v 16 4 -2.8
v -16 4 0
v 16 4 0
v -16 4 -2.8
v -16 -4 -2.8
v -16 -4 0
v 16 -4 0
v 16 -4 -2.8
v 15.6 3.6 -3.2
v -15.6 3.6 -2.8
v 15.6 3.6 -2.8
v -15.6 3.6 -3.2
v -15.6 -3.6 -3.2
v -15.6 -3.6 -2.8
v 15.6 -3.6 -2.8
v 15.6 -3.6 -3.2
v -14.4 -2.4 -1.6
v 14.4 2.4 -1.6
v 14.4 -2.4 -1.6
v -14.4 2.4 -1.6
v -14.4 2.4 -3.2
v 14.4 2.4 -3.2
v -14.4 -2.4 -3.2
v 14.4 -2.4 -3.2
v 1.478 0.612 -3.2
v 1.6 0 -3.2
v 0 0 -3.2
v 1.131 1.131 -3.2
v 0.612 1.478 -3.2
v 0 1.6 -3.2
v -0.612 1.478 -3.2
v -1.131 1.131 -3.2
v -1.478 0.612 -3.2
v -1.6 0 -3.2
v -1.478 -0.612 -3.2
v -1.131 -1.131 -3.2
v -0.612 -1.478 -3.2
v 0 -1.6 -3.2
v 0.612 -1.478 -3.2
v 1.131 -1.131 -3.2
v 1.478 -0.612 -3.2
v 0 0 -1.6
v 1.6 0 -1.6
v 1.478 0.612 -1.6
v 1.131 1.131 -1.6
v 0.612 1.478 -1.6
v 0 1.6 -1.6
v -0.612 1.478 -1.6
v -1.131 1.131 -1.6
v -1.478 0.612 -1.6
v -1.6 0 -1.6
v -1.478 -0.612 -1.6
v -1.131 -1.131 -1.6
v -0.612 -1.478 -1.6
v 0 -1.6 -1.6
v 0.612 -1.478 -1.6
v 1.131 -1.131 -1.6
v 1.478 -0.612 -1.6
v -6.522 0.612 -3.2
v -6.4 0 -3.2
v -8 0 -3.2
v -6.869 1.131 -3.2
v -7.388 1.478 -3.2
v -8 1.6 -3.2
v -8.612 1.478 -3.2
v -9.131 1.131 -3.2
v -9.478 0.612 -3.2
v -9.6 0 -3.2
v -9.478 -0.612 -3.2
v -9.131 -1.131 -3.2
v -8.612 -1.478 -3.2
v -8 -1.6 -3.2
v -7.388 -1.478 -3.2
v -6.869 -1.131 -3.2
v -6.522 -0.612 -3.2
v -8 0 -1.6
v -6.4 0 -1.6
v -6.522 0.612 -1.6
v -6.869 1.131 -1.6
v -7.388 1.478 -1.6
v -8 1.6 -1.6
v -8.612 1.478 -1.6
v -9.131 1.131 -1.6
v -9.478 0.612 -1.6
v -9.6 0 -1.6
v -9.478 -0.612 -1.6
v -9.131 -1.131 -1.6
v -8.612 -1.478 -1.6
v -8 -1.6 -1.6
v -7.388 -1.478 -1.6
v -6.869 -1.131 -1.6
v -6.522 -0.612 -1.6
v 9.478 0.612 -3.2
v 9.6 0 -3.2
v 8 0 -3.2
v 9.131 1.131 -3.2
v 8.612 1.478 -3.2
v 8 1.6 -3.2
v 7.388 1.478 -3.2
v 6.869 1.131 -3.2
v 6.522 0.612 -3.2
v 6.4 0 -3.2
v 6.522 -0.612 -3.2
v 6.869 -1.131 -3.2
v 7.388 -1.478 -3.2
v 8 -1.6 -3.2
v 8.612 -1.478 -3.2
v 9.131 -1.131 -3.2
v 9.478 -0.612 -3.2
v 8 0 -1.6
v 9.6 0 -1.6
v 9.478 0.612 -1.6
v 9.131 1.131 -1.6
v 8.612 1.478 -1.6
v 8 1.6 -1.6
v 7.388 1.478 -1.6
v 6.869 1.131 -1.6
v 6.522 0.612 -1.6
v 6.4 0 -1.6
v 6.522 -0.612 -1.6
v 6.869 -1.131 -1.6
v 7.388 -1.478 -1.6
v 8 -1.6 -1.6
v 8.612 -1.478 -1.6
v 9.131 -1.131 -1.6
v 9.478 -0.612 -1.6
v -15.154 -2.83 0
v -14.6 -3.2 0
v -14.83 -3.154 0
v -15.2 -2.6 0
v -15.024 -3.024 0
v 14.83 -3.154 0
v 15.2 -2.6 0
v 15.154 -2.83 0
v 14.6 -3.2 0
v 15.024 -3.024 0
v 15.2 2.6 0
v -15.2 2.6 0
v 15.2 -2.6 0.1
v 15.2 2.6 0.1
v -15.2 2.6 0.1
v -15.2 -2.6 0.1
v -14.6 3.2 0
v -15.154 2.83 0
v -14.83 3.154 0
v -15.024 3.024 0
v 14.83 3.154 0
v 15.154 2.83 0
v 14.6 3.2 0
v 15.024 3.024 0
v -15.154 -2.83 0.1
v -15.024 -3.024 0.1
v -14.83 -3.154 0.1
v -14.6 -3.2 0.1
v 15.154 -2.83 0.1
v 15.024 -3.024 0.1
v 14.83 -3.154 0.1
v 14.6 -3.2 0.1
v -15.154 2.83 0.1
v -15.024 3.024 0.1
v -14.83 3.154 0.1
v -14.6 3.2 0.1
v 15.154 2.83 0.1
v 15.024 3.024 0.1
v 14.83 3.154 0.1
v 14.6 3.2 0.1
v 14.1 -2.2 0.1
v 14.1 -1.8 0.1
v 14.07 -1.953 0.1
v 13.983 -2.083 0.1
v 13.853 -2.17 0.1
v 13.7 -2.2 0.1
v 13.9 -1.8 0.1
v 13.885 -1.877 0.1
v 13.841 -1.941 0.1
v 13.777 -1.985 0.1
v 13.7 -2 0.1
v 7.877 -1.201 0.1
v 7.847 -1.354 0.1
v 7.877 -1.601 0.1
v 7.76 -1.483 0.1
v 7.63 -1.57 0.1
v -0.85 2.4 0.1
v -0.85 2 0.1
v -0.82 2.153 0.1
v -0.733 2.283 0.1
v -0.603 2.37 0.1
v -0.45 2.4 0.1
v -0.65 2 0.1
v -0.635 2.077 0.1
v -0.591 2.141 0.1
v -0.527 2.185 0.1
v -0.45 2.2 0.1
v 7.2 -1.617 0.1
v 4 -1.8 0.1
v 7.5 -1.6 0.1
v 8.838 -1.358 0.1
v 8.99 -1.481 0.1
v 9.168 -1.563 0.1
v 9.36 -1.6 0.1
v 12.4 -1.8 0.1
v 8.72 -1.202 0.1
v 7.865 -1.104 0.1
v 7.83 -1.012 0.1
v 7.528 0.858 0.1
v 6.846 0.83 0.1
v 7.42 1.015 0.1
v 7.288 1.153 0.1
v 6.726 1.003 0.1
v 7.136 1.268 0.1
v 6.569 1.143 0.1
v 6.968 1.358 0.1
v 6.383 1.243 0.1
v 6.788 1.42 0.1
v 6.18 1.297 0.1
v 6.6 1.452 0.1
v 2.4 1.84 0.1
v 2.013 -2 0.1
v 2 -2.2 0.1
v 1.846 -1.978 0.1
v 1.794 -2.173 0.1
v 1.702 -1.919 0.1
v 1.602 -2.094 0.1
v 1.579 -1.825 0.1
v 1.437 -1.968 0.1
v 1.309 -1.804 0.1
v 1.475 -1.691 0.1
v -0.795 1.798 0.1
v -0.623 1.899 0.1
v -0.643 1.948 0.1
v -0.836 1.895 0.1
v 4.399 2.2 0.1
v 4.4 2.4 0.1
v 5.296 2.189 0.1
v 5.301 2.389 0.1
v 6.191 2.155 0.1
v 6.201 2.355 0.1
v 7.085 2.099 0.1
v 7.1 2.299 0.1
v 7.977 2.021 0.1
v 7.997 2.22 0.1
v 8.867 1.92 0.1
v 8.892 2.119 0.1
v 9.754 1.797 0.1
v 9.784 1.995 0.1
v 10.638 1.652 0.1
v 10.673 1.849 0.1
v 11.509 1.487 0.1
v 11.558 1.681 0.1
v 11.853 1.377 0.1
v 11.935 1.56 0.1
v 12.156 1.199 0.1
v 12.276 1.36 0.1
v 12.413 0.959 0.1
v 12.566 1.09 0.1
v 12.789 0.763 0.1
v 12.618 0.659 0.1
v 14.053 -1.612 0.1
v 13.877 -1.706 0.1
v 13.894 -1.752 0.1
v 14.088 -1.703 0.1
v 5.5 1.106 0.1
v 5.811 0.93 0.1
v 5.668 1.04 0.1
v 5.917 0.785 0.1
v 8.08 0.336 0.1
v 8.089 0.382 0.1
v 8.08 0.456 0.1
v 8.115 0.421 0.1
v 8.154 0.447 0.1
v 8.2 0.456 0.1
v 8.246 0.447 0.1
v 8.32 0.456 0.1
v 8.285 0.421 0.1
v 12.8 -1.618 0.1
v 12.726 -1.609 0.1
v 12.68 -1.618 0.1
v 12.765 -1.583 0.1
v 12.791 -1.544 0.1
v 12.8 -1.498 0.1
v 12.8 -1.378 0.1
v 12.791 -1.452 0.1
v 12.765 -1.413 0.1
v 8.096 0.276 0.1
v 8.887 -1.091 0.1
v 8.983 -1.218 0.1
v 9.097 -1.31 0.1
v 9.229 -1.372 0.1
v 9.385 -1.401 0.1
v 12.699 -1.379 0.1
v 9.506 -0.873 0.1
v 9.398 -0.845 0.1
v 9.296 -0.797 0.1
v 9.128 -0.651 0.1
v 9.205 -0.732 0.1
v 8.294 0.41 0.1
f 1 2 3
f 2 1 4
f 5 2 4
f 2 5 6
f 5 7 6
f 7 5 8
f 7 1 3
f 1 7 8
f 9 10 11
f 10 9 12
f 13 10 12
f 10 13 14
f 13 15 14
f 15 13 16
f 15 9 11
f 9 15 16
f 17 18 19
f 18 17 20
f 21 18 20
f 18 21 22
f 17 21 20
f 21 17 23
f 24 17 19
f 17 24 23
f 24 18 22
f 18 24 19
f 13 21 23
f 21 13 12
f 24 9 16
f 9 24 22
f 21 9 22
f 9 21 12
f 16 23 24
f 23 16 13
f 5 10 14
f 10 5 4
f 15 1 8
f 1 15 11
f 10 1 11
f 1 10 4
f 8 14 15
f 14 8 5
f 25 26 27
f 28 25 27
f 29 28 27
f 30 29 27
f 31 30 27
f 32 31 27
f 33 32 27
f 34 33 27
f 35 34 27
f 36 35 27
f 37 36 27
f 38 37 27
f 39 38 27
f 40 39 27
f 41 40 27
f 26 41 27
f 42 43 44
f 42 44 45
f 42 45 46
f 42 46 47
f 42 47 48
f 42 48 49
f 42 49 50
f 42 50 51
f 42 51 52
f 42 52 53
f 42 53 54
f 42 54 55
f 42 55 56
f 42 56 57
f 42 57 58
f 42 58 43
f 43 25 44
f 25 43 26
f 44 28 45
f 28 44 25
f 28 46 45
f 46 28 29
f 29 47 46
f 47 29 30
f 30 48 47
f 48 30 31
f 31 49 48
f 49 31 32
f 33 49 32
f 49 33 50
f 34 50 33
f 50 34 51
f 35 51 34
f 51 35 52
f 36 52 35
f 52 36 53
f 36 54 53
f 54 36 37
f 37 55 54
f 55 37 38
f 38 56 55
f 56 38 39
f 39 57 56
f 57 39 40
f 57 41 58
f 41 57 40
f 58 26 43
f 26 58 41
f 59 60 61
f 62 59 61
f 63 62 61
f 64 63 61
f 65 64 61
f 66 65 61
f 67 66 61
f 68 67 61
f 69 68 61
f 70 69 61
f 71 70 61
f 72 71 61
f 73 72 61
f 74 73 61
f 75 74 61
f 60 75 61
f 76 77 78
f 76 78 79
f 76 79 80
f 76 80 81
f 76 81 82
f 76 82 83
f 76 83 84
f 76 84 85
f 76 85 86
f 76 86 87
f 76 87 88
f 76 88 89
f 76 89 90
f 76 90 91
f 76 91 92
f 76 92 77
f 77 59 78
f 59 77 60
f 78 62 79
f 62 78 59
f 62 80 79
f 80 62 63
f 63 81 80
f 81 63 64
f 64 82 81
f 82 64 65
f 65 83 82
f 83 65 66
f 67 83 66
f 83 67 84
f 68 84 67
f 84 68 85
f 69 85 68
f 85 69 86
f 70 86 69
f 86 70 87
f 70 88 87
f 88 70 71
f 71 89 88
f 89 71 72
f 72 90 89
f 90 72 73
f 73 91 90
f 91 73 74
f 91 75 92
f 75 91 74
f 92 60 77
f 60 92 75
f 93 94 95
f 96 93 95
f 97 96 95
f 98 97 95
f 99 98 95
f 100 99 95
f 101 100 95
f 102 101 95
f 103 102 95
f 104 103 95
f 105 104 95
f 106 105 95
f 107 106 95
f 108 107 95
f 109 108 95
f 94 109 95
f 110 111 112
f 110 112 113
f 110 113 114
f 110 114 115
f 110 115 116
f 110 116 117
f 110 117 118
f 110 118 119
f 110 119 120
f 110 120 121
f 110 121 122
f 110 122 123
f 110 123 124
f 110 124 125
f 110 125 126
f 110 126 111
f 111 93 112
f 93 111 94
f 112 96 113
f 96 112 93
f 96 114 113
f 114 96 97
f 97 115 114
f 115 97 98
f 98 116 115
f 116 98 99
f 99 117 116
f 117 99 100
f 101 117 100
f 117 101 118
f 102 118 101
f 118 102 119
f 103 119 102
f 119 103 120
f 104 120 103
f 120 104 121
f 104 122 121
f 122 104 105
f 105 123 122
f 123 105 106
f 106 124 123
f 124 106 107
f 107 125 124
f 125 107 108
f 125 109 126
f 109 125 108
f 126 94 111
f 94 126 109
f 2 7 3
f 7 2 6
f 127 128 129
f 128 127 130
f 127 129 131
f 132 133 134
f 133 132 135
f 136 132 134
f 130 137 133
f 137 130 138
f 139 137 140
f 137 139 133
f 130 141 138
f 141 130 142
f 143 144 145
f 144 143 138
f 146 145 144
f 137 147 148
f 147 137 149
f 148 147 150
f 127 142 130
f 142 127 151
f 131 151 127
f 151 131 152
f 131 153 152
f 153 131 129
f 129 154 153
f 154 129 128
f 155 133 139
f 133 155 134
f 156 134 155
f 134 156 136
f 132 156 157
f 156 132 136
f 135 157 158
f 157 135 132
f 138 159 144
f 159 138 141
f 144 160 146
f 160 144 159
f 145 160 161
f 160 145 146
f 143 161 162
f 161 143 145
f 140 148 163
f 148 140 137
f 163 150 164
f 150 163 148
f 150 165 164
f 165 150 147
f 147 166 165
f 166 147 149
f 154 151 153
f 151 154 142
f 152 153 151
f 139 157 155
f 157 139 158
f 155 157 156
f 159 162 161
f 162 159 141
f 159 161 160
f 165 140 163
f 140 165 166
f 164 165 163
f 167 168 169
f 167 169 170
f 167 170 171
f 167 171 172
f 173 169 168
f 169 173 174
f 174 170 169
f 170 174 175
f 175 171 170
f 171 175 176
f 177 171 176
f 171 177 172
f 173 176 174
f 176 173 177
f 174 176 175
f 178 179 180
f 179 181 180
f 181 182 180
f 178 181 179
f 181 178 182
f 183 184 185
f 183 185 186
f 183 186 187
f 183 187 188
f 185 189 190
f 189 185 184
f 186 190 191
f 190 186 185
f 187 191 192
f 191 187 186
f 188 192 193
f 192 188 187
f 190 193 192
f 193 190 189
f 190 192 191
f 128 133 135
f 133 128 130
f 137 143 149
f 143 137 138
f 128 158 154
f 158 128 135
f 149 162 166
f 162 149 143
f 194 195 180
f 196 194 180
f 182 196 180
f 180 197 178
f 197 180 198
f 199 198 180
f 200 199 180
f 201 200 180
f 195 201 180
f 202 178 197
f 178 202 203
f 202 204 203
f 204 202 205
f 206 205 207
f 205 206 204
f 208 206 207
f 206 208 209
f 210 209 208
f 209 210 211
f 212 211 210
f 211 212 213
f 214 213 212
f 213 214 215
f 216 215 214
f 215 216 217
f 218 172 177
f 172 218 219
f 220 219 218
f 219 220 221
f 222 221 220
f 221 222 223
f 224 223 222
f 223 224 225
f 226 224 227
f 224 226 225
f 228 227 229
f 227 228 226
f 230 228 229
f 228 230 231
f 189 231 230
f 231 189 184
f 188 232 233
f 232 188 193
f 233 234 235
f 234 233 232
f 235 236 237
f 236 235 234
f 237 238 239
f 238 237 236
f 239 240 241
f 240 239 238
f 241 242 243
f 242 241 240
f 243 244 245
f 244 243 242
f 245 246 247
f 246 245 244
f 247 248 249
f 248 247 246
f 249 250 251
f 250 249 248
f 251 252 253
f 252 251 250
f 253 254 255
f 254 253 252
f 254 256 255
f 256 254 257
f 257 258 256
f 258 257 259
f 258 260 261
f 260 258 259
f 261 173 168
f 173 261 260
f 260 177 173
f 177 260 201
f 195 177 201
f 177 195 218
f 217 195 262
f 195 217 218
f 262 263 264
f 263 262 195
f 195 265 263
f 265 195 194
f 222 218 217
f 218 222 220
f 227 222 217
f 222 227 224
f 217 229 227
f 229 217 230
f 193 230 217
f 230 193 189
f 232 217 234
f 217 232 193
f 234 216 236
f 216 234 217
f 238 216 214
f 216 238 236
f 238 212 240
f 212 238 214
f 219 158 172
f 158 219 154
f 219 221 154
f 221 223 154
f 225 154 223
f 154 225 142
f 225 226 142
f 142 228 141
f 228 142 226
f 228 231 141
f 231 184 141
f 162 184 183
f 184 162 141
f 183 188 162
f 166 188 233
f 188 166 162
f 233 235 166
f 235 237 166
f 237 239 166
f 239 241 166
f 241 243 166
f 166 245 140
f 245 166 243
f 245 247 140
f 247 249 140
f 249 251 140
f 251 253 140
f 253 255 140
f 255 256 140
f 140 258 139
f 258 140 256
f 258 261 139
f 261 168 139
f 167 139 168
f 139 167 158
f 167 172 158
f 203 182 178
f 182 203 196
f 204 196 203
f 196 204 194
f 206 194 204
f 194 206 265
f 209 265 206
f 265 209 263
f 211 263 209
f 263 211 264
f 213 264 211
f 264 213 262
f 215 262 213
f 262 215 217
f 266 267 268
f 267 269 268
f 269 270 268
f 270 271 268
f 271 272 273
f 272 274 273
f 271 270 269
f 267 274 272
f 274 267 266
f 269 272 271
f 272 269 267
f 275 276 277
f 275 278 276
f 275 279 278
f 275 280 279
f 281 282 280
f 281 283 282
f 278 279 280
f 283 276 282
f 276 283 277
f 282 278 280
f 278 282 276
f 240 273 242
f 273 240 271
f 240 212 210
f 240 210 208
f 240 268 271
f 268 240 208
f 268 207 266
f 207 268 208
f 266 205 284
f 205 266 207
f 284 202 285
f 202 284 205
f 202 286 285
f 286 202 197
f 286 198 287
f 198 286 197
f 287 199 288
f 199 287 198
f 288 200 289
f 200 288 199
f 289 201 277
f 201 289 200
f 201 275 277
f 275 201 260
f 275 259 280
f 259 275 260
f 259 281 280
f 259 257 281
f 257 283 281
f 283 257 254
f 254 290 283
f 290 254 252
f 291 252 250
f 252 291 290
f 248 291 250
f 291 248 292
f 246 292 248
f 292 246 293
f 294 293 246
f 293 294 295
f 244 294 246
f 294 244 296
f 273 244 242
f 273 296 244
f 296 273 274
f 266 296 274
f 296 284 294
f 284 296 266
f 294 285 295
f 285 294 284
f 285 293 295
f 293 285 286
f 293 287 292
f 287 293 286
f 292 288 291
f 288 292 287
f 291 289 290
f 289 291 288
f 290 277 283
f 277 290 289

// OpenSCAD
use <../lib.scad>
use <2431.scad>
use <6141955k.scad>
function ldraw_lib__2431d1b() = [
// 0 Tile  1 x  4 with Black Air Vents and White Reflex on Blue Background Right Sticker
// 0 Name: 2431d1b.dat
// 0 Author: Alfred Schmitz [AlfredS]
// 0 !LDRAW_ORG Shortcut UPDATE 2026-09
// 0 !LICENSE Licensed under CC BY 4.0 : see CAreadme.txt
// 
// 0 BFC CERTIFY CCW
  [0,"BFC","CERTIFY"],
  [0,"BFC","CCW"],
// 
// 0 !CATEGORY Sticker Shortcut
// 0 !KEYWORDS Ford, GT, Mustang, Set 75871, Speed Champions
// 
// 0 !HISTORY 2026-09-30 [OrionP] Official Update 2026-09
// 
// 1 16 0 0 0 1 0 0 0 1 0 0 0 1 2431.dat
  [1,16,0,0,0,1,0,0,0,1,0,0,0,1, ldraw_lib__2431()],
// 1 16 0 0 0 1 0 0 0 1 0 0 0 1 6141955k.dat
  [1,16,0,0,0,1,0,0,0,1,0,0,0,1, ldraw_lib__6141955k()],
];
module ldraw_lib__2431d1b(step=0, col=false, unit=2/5, alt=false, line=0.2, solid=!$preview)
    makepoly(ldraw_lib__2431d1b(), step=step, col=col, unit=unit, alt=alt, line=line, solid=solid);
ldraw_lib__2431d1b(line=0.2);
